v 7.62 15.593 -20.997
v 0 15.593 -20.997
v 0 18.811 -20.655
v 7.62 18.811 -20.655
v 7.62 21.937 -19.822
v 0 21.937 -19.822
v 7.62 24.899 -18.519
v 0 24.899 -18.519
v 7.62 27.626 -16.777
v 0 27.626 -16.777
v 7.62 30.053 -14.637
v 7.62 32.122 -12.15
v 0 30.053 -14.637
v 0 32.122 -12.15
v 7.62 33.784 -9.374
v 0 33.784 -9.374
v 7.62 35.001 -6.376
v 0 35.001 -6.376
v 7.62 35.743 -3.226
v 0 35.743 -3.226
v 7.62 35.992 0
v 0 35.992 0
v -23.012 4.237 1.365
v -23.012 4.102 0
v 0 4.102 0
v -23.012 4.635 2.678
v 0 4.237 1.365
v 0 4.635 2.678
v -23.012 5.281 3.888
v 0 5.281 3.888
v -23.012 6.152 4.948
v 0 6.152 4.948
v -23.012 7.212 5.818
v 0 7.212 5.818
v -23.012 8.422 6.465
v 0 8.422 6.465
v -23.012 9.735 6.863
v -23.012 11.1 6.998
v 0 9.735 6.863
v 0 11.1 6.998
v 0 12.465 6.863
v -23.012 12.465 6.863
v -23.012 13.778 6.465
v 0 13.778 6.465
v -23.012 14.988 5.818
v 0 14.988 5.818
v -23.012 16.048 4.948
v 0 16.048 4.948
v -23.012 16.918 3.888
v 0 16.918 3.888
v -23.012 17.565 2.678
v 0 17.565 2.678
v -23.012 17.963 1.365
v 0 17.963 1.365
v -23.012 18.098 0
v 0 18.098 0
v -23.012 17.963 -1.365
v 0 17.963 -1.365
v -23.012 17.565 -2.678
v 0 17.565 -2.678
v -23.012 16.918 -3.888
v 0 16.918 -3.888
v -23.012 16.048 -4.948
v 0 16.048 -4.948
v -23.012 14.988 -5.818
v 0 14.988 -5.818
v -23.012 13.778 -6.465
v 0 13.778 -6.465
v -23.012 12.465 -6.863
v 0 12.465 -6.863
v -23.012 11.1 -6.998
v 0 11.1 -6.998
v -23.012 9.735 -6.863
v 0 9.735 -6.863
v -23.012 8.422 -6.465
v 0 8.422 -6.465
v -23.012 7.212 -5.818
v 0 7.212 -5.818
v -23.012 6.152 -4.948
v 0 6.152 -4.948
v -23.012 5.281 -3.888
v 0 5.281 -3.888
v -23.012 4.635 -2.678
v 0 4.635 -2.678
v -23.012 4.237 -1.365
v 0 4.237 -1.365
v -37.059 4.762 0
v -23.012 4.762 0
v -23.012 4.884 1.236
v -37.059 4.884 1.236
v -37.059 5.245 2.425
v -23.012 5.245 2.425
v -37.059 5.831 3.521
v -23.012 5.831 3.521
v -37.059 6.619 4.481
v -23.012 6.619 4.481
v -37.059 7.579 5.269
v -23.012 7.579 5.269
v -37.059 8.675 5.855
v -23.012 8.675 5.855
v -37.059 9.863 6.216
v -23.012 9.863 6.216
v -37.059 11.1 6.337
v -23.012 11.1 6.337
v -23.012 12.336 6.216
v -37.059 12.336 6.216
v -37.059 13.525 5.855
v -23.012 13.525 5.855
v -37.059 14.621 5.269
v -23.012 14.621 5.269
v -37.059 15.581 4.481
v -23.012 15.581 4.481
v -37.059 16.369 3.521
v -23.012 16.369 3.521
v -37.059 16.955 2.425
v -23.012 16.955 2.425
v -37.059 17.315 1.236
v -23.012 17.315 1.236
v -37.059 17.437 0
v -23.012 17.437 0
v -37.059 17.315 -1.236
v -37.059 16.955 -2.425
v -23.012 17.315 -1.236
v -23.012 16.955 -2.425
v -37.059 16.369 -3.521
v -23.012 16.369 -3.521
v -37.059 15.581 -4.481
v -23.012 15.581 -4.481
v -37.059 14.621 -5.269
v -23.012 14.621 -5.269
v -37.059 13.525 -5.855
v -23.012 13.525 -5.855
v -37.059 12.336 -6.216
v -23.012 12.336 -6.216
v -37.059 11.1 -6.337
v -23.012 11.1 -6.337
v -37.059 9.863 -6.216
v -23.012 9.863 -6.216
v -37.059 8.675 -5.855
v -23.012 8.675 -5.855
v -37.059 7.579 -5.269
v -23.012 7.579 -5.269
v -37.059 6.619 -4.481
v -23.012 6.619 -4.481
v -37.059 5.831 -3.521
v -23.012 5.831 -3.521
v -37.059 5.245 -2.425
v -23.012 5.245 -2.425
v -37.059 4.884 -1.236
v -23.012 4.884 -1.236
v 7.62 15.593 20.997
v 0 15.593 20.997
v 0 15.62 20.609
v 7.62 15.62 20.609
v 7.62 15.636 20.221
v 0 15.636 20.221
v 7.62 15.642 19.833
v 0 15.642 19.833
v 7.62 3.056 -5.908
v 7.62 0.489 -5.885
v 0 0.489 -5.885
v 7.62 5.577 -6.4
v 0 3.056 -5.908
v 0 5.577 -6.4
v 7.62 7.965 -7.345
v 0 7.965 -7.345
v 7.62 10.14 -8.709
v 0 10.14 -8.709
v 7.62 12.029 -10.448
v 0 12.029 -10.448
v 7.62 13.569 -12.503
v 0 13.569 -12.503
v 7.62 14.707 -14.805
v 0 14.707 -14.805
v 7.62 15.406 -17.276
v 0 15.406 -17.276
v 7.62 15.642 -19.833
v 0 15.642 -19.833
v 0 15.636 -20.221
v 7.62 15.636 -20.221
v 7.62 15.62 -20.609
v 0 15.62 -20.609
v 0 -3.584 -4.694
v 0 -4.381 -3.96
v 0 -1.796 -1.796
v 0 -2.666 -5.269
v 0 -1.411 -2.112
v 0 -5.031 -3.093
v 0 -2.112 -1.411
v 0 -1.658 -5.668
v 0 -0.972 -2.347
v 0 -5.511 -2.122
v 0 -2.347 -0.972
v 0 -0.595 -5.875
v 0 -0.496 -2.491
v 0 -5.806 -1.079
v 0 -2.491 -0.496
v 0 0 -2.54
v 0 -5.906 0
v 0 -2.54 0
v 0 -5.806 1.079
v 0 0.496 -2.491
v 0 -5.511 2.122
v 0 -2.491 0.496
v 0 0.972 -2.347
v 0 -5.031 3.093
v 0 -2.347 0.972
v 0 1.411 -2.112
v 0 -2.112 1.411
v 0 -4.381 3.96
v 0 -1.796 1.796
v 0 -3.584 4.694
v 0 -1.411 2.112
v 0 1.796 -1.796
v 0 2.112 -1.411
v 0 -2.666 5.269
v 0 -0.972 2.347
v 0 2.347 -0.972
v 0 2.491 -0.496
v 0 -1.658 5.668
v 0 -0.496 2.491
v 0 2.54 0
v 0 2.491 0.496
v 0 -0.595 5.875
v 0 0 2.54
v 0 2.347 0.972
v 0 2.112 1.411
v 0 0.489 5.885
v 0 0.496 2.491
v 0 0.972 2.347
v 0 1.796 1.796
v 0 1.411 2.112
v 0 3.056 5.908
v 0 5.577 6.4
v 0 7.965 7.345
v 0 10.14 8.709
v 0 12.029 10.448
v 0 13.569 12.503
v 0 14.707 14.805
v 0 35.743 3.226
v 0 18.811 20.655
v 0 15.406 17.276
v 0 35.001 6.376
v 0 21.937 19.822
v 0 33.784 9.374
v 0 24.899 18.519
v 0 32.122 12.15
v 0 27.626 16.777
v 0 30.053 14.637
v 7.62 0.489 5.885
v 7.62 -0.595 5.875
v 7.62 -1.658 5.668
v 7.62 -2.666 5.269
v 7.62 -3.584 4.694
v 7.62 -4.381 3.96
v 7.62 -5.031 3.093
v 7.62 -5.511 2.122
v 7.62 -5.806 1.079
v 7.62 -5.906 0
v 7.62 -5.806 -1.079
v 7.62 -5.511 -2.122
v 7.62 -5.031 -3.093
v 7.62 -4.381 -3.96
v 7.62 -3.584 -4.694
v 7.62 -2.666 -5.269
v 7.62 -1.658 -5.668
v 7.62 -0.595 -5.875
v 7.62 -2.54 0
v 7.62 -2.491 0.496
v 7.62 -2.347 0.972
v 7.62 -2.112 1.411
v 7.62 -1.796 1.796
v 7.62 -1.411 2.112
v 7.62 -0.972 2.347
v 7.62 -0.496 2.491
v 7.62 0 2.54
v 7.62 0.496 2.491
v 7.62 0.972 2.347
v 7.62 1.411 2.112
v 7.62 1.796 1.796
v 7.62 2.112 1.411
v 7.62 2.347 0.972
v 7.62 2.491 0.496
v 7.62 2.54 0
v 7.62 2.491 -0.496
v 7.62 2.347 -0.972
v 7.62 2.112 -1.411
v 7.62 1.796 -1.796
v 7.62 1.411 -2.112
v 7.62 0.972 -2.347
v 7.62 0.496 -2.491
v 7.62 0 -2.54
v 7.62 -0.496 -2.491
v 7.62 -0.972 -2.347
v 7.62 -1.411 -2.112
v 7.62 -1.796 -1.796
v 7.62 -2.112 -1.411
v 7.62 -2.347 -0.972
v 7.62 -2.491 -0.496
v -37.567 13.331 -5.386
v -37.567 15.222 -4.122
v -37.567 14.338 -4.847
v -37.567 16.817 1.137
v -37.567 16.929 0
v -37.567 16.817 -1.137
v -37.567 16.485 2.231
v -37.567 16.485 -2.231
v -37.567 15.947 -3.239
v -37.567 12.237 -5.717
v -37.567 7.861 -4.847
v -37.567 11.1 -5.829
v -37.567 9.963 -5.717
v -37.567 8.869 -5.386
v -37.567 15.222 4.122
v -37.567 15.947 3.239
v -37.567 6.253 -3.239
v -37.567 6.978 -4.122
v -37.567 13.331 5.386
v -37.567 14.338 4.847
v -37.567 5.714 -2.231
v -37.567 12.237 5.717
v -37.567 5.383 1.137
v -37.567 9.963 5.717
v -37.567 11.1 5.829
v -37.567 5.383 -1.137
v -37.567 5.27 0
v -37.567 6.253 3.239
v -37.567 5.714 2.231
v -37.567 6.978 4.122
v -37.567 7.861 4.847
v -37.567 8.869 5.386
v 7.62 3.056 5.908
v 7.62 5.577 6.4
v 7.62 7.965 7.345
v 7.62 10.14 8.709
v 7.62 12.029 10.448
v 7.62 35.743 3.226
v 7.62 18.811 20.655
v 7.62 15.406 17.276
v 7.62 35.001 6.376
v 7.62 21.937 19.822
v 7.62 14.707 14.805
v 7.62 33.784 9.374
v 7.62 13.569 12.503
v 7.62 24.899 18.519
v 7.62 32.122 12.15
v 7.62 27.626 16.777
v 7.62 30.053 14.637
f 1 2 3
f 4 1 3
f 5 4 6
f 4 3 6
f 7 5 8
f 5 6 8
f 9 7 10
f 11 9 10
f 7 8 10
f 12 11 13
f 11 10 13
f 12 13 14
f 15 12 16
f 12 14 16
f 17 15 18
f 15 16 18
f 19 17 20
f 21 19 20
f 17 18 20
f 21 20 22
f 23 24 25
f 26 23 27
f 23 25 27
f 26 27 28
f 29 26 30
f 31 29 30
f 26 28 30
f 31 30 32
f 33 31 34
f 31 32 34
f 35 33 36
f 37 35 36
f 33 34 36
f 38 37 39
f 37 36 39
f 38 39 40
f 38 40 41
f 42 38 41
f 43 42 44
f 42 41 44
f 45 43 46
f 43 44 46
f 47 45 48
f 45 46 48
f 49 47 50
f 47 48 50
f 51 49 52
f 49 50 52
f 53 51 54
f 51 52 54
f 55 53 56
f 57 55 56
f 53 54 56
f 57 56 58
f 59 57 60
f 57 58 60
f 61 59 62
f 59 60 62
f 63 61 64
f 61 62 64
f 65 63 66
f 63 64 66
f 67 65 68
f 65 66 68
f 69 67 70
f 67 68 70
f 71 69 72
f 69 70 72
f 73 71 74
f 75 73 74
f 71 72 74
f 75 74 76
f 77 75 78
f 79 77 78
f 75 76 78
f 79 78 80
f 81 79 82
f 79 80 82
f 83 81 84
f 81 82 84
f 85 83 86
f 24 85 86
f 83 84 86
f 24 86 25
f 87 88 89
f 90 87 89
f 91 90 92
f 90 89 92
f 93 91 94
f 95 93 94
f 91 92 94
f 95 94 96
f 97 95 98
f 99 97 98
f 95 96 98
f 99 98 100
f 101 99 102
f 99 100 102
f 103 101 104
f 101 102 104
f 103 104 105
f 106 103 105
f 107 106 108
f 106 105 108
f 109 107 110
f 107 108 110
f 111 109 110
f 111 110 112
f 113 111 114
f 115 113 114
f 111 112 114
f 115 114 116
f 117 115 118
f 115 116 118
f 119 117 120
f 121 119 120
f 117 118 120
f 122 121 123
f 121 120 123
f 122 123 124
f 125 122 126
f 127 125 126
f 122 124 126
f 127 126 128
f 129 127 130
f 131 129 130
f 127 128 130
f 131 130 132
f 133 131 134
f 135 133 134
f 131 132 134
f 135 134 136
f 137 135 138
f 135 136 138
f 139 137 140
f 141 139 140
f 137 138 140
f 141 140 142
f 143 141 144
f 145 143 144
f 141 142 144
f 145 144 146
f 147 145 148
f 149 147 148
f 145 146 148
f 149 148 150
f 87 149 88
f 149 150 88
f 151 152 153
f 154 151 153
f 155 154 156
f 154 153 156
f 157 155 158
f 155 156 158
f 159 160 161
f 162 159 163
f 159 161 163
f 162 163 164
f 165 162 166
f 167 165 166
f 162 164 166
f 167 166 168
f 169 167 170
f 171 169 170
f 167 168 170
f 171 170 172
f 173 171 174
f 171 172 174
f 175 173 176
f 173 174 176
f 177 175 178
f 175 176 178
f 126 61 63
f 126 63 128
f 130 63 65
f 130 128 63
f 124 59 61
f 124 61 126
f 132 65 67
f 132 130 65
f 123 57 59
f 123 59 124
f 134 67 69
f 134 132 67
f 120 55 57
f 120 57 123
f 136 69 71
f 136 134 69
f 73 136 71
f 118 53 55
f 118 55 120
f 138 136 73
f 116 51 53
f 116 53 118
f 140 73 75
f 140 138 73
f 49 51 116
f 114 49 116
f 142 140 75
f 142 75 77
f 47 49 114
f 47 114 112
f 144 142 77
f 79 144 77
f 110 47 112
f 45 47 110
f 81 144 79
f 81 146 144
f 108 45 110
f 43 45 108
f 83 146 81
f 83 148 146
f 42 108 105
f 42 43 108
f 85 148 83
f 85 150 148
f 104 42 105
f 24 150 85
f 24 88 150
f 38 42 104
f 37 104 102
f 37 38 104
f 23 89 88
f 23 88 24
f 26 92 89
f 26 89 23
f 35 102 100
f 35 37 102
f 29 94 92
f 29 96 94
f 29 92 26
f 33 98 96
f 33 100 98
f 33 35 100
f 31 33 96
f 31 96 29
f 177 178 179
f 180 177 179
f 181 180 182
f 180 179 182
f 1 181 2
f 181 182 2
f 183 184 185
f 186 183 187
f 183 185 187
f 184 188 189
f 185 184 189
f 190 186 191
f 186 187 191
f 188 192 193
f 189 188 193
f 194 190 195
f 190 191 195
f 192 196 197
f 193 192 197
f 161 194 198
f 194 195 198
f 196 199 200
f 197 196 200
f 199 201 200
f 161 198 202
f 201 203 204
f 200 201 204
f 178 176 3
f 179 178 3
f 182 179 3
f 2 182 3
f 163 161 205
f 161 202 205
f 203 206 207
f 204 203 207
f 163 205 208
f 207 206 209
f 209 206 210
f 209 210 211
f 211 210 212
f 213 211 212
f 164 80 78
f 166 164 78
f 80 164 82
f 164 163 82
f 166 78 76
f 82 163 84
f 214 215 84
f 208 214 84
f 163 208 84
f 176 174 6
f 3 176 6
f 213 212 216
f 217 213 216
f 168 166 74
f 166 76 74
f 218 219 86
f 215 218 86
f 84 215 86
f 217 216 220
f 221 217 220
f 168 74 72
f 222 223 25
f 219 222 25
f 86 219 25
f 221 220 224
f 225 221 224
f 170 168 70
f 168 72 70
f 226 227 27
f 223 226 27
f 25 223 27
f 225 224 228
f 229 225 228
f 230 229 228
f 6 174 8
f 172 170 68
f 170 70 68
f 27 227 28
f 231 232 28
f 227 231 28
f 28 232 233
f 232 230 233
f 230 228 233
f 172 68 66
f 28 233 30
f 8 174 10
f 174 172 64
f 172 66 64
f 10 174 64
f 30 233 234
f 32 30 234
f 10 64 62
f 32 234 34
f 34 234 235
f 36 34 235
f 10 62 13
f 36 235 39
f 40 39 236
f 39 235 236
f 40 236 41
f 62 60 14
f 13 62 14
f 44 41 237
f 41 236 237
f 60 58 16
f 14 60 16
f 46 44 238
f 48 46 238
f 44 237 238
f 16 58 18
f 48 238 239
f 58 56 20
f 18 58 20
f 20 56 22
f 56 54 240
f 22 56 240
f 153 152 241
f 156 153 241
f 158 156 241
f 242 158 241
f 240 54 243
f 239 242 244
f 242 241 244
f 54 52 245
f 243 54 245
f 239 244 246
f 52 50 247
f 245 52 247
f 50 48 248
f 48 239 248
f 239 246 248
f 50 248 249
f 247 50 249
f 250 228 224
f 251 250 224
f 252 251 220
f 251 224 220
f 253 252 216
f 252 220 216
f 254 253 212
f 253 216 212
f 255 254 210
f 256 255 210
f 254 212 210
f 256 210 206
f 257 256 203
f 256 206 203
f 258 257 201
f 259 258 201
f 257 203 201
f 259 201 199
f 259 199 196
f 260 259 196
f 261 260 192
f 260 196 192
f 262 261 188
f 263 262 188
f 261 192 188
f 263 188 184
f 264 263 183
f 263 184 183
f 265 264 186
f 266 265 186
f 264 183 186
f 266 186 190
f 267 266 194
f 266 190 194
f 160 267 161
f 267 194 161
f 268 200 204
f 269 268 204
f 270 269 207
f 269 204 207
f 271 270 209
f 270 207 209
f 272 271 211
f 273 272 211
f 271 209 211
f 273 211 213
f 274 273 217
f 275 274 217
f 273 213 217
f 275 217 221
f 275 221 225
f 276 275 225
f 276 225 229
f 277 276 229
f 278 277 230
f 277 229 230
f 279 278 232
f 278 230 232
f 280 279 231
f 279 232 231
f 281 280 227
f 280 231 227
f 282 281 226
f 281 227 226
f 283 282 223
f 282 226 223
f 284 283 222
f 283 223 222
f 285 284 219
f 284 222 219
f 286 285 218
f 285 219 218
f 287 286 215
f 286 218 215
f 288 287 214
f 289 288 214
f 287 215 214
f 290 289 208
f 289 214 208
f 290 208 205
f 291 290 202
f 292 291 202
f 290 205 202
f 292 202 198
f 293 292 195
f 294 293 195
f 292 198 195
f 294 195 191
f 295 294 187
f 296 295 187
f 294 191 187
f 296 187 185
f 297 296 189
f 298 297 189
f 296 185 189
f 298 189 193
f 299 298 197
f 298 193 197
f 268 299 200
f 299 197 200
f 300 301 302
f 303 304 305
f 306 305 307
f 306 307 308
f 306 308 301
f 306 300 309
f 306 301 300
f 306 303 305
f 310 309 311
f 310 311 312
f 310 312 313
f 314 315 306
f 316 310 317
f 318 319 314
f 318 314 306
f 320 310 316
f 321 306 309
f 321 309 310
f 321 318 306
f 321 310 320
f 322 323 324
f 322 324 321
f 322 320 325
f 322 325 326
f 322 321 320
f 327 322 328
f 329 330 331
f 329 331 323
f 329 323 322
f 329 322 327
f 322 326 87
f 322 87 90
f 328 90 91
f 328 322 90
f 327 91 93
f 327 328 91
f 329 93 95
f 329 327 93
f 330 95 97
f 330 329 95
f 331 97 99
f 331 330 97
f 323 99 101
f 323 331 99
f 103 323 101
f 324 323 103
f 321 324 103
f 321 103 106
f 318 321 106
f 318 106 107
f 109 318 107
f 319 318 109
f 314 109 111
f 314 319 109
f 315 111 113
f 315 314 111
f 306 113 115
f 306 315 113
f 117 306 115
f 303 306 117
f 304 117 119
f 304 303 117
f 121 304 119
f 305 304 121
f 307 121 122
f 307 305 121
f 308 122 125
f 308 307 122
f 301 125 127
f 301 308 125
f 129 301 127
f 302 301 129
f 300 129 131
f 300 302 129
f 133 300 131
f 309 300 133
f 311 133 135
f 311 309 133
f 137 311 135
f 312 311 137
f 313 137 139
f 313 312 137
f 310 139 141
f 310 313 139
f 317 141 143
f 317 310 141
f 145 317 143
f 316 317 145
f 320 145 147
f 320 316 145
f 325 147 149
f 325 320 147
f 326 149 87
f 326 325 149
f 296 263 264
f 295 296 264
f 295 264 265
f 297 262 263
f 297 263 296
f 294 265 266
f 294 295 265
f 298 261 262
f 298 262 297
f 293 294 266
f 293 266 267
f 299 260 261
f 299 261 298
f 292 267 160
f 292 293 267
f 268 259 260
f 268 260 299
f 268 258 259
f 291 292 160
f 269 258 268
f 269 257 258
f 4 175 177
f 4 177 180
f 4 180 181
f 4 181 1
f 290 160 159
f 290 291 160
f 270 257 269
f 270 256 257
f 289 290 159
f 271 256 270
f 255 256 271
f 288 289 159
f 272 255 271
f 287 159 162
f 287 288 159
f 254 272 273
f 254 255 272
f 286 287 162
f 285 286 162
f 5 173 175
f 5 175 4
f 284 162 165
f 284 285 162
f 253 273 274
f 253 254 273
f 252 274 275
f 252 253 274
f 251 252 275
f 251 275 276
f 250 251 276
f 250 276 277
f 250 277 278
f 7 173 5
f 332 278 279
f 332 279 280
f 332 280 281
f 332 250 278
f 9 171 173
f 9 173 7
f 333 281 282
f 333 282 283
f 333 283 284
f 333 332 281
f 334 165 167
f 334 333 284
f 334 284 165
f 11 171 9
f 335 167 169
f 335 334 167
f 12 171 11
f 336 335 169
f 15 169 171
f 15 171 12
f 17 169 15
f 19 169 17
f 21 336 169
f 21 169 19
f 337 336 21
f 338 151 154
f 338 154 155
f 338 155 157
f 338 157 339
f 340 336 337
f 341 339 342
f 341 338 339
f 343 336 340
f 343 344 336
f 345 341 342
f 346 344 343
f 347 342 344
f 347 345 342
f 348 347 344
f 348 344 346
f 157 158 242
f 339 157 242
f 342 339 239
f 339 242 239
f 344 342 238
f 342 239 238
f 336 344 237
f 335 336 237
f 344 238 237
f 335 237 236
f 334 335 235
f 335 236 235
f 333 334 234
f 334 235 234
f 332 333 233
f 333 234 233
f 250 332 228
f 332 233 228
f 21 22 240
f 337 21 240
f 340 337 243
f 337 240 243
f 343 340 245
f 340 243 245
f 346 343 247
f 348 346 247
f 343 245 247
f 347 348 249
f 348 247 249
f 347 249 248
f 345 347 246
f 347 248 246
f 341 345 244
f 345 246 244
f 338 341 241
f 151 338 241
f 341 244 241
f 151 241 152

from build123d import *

# Parameters (mm, degrees)
F1_DEPTH = 7.62
F2_R     = 6.9977
F3_DEPTH = 23.0124
F4_R     = 6.3373
F5_DEPTH = 14.5542
F6_SIZE  = 0.508


with BuildPart() as f1:
    # F0 (on Right) → F1 (new body)
    with BuildSketch(Plane.YZ):
        with BuildLine():
            ThreePointArc((0.488564857, 5.885255698), (4.3451208276, 3.9993568537), (5.9055, 0))
            Line((5.9055, 0), (35.9918, 0))
            ThreePointArc((35.9918, 0), (30.0525244802, 14.6370582333), (15.5932935183, 20.9970195081))
            ThreePointArc((15.5932935183, 20.9970195081), (15.6296763666, 20.4153544005), (15.6418109969, 19.8326788821))
            ThreePointArc((15.6418109969, 19.8326788821), (11.1244567157, 9.5352097506), (0.488564857, 5.885255698))
        make_face()
        with BuildLine():
            Line((35.9918, 0), (5.9055, 0))
            ThreePointArc((5.9055, 0), (4.3451208206, -3.9993568613), (0.4885648365, -5.8852556997))
            ThreePointArc((0.4885648365, -5.8852556997), (11.1244567081, -9.5352097437), (15.6418109969, -19.8326788821))
            ThreePointArc((15.6418109969, -19.8326788821), (15.6296763666, -20.4153544005), (15.5932935183, -20.9970195081))
            ThreePointArc((15.5932935183, -20.9970195081), (30.0525244802, -14.6370582333), (35.9918, 0))
        make_face()
        with BuildLine():
            Line((5.9055, 0), (2.54, 0))
            ThreePointArc((2.54, 0), (0, -2.54), (-2.54, 0))
            Line((-2.54, 0), (-5.9055, 0))
            ThreePointArc((-5.9055, 0), (-3.9993568613, -4.3451208206), (0.4885648365, -5.8852556997))
            ThreePointArc((0.4885648365, -5.8852556997), (4.3451208206, -3.9993568613), (5.9055, 0))
        make_face()
        with BuildLine():
            ThreePointArc((-2.54, 0), (0, 2.54), (2.54, 0))
            Line((2.54, 0), (5.9055, 0))
            ThreePointArc((5.9055, 0), (4.3451208276, 3.9993568537), (0.488564857, 5.885255698))
            ThreePointArc((0.488564857, 5.885255698), (-3.9993568537, 4.3451208276), (-5.9055, 0))
            Line((-5.9055, 0), (-2.54, 0))
        make_face()
    extrude(amount=F1_DEPTH)

    # F2 (on face) → F3 (join)
    with BuildSketch(Plane(origin=(0, 0, 0), x_dir=(0, -1, 0), z_dir=(-1, 0, 0))):
        with Locations((-11.0998, 0)):
            Circle(F2_R)
    extrude(amount=F3_DEPTH)

    # F4 (on face) → F5 (join)
    with BuildSketch(Plane(origin=(-23.0124, 0, 0), x_dir=(0, -1, 0), z_dir=(-1, 0, 0))):
        with Locations((-11.0998, 0)):
            Circle(F4_R)
    extrude(amount=F5_DEPTH)

    # F6
    f6_edges = [f1.edges().sort_by_distance(p)[0] for p in [
        (-37.5666, 17.4371, 0),
    ]]
    chamfer(f6_edges, length=F6_SIZE)


solid = f1.part
